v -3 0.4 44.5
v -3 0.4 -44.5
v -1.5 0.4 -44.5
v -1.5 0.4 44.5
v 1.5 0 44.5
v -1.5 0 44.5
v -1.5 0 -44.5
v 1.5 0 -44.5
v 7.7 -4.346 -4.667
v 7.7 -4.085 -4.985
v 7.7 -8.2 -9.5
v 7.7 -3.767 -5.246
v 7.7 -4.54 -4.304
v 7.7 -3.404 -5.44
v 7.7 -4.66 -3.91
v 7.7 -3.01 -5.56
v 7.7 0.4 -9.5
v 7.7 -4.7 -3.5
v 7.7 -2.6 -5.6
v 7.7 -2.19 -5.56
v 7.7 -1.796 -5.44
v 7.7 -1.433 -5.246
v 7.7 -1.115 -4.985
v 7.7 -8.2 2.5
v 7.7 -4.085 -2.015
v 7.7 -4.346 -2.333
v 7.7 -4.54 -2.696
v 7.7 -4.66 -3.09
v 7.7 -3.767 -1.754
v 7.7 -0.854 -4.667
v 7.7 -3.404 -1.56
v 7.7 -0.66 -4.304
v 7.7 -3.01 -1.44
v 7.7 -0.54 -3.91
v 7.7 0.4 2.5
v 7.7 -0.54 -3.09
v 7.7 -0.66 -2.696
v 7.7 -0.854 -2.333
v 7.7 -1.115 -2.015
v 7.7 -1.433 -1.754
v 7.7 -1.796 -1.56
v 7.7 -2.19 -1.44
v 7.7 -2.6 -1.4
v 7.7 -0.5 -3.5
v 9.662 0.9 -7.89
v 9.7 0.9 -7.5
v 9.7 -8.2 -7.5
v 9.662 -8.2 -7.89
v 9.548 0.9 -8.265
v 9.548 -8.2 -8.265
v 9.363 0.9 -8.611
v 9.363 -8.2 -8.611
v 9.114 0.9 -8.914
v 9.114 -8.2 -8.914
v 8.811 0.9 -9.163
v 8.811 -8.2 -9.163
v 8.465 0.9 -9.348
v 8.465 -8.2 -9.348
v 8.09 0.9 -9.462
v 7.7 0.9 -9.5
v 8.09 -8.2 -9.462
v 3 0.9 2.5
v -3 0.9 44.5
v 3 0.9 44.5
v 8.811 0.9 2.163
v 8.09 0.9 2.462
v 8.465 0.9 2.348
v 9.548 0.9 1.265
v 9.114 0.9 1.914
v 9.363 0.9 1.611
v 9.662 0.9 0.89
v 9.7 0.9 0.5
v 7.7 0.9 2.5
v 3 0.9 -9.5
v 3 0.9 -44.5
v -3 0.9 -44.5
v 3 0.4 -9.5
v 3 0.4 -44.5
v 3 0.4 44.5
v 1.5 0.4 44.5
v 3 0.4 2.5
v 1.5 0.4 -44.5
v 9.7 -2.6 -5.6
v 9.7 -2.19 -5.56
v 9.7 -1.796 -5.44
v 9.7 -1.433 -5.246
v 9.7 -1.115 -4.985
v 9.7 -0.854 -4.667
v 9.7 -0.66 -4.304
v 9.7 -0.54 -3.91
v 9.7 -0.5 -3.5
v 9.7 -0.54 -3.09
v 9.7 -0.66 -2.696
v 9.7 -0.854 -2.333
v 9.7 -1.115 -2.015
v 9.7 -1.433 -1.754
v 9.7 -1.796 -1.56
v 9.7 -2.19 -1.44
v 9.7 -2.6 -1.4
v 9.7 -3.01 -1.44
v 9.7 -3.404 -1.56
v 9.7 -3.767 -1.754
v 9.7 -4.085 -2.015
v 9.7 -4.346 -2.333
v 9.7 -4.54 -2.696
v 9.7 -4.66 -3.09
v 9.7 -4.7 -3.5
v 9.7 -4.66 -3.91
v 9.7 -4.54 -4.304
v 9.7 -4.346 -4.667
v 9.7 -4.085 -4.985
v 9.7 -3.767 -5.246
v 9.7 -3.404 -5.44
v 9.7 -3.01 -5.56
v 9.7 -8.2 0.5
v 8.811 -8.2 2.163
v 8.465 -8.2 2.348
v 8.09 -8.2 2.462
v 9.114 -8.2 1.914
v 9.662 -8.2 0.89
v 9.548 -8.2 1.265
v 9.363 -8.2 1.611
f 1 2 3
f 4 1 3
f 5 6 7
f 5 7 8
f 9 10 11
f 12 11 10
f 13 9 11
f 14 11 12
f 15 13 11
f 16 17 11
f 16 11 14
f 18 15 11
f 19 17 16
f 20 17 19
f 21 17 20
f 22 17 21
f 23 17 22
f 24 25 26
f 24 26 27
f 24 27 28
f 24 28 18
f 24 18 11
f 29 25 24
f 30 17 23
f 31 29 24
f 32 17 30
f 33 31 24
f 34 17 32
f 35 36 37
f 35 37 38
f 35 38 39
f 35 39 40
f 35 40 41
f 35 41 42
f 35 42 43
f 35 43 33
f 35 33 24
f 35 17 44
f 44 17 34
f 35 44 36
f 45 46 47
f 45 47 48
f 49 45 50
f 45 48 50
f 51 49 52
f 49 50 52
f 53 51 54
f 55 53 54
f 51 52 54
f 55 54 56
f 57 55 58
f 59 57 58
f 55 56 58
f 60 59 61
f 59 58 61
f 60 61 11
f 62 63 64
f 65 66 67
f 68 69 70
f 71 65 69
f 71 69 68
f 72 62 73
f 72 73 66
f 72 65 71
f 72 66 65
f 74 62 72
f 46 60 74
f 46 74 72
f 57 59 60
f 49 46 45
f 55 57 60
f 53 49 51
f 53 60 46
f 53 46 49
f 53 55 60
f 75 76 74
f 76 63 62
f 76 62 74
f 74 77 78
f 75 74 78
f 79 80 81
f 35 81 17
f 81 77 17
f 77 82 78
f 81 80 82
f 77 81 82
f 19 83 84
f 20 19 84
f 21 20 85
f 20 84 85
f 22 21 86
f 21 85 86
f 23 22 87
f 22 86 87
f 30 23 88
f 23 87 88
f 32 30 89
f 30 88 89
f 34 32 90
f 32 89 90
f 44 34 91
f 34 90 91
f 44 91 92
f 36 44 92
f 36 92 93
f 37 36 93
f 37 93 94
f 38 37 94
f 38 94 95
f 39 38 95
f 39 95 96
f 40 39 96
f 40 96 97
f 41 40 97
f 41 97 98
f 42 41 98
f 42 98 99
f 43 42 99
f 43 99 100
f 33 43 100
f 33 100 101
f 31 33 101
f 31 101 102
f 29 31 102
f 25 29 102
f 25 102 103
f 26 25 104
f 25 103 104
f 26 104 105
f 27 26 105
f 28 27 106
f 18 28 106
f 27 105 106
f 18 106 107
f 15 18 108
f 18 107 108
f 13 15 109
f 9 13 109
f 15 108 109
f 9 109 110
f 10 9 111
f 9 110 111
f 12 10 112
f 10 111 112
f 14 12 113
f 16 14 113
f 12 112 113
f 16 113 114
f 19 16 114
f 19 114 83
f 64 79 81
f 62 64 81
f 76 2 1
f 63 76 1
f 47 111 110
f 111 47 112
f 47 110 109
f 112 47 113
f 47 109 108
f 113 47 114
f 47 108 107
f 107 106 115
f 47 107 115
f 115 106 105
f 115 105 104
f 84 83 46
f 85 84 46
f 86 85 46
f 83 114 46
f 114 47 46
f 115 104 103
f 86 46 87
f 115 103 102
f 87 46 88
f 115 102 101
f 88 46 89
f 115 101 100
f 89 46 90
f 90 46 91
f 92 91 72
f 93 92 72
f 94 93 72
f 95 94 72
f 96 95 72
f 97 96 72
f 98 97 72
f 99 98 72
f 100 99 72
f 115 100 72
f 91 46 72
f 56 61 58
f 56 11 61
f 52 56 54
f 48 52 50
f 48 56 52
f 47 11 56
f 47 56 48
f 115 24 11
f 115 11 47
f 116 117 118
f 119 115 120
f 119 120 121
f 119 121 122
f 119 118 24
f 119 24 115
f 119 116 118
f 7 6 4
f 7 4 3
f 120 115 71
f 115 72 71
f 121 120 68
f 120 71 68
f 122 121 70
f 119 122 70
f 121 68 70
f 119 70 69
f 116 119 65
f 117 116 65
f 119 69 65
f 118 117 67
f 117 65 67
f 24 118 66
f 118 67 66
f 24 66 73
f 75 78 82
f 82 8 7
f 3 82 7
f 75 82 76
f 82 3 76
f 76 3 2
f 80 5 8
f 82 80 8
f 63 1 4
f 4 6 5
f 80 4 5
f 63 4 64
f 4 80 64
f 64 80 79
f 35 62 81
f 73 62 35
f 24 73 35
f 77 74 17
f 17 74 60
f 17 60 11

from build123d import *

# Parameters (mm, degrees)
SKETCH1_W           = 3
SKETCH1_H           = 89
BOSS_EXTRUDE1_DEPTH = 0.4
BOSS_EXTRUDE2_DEPTH = 0.5
SKETCH3_W           = 2
SKETCH3_H           = 12
BOSS_EXTRUDE3_DEPTH = 8.6
FILLET1_R           = 2
SKETCH4_R           = 2.1
CUT_EXTRUDE1_DEPTH  = 47.997659516


with BuildPart() as part:
    # Sketch1 → Boss-Extrude1 (new body)
    with BuildSketch(Plane(origin=(0, 0, 0), x_dir=(1, 0, 0), z_dir=(0, 1, 0))):
        Rectangle(SKETCH1_W, SKETCH1_H)
    extrude(amount=BOSS_EXTRUDE1_DEPTH)

    # Sketch2 → Boss-Extrude2 (add)
    with BuildSketch(Plane(origin=(0, 0.4, 0), x_dir=(1, 0, 0), z_dir=(0, 1, 0))):
        Polygon((3, 9.5), (3, 44.5), (-3, 44.5), (-3, -44.5), (3, -44.5), (3, -2.5), (9.7, -2.5), (9.7, 9.5), align=None)
    extrude(amount=BOSS_EXTRUDE2_DEPTH)

    # Sketch3 → Boss-Extrude3 (add)
    with BuildSketch(Plane.XZ.offset(-0.4)):
        with Locations((8.7, -3.5)):
            Rectangle(SKETCH3_W, SKETCH3_H)
    extrude(amount=BOSS_EXTRUDE3_DEPTH)

    # Fillet1
    fillet1_edges = [part.edges().sort_by_distance(p)[0] for p in [
        (9.7, -3.65, 2.5),
        (9.7, -3.65, -9.5),
    ]]
    fillet(fillet1_edges, radius=FILLET1_R - 0.0001)  # a hair under: the kernel refuses the full size

    # Sketch4 → Cut-Extrude1 (cut, through all)
    with BuildSketch(Plane(origin=(9.7, 0, 0), x_dir=(0, 0, -1), z_dir=(1, 0, 0))):
        with Locations((3.5, -2.6)):
            Circle(SKETCH4_R)
    extrude(amount=-CUT_EXTRUDE1_DEPTH, mode=Mode.SUBTRACT)


solid = part.part
